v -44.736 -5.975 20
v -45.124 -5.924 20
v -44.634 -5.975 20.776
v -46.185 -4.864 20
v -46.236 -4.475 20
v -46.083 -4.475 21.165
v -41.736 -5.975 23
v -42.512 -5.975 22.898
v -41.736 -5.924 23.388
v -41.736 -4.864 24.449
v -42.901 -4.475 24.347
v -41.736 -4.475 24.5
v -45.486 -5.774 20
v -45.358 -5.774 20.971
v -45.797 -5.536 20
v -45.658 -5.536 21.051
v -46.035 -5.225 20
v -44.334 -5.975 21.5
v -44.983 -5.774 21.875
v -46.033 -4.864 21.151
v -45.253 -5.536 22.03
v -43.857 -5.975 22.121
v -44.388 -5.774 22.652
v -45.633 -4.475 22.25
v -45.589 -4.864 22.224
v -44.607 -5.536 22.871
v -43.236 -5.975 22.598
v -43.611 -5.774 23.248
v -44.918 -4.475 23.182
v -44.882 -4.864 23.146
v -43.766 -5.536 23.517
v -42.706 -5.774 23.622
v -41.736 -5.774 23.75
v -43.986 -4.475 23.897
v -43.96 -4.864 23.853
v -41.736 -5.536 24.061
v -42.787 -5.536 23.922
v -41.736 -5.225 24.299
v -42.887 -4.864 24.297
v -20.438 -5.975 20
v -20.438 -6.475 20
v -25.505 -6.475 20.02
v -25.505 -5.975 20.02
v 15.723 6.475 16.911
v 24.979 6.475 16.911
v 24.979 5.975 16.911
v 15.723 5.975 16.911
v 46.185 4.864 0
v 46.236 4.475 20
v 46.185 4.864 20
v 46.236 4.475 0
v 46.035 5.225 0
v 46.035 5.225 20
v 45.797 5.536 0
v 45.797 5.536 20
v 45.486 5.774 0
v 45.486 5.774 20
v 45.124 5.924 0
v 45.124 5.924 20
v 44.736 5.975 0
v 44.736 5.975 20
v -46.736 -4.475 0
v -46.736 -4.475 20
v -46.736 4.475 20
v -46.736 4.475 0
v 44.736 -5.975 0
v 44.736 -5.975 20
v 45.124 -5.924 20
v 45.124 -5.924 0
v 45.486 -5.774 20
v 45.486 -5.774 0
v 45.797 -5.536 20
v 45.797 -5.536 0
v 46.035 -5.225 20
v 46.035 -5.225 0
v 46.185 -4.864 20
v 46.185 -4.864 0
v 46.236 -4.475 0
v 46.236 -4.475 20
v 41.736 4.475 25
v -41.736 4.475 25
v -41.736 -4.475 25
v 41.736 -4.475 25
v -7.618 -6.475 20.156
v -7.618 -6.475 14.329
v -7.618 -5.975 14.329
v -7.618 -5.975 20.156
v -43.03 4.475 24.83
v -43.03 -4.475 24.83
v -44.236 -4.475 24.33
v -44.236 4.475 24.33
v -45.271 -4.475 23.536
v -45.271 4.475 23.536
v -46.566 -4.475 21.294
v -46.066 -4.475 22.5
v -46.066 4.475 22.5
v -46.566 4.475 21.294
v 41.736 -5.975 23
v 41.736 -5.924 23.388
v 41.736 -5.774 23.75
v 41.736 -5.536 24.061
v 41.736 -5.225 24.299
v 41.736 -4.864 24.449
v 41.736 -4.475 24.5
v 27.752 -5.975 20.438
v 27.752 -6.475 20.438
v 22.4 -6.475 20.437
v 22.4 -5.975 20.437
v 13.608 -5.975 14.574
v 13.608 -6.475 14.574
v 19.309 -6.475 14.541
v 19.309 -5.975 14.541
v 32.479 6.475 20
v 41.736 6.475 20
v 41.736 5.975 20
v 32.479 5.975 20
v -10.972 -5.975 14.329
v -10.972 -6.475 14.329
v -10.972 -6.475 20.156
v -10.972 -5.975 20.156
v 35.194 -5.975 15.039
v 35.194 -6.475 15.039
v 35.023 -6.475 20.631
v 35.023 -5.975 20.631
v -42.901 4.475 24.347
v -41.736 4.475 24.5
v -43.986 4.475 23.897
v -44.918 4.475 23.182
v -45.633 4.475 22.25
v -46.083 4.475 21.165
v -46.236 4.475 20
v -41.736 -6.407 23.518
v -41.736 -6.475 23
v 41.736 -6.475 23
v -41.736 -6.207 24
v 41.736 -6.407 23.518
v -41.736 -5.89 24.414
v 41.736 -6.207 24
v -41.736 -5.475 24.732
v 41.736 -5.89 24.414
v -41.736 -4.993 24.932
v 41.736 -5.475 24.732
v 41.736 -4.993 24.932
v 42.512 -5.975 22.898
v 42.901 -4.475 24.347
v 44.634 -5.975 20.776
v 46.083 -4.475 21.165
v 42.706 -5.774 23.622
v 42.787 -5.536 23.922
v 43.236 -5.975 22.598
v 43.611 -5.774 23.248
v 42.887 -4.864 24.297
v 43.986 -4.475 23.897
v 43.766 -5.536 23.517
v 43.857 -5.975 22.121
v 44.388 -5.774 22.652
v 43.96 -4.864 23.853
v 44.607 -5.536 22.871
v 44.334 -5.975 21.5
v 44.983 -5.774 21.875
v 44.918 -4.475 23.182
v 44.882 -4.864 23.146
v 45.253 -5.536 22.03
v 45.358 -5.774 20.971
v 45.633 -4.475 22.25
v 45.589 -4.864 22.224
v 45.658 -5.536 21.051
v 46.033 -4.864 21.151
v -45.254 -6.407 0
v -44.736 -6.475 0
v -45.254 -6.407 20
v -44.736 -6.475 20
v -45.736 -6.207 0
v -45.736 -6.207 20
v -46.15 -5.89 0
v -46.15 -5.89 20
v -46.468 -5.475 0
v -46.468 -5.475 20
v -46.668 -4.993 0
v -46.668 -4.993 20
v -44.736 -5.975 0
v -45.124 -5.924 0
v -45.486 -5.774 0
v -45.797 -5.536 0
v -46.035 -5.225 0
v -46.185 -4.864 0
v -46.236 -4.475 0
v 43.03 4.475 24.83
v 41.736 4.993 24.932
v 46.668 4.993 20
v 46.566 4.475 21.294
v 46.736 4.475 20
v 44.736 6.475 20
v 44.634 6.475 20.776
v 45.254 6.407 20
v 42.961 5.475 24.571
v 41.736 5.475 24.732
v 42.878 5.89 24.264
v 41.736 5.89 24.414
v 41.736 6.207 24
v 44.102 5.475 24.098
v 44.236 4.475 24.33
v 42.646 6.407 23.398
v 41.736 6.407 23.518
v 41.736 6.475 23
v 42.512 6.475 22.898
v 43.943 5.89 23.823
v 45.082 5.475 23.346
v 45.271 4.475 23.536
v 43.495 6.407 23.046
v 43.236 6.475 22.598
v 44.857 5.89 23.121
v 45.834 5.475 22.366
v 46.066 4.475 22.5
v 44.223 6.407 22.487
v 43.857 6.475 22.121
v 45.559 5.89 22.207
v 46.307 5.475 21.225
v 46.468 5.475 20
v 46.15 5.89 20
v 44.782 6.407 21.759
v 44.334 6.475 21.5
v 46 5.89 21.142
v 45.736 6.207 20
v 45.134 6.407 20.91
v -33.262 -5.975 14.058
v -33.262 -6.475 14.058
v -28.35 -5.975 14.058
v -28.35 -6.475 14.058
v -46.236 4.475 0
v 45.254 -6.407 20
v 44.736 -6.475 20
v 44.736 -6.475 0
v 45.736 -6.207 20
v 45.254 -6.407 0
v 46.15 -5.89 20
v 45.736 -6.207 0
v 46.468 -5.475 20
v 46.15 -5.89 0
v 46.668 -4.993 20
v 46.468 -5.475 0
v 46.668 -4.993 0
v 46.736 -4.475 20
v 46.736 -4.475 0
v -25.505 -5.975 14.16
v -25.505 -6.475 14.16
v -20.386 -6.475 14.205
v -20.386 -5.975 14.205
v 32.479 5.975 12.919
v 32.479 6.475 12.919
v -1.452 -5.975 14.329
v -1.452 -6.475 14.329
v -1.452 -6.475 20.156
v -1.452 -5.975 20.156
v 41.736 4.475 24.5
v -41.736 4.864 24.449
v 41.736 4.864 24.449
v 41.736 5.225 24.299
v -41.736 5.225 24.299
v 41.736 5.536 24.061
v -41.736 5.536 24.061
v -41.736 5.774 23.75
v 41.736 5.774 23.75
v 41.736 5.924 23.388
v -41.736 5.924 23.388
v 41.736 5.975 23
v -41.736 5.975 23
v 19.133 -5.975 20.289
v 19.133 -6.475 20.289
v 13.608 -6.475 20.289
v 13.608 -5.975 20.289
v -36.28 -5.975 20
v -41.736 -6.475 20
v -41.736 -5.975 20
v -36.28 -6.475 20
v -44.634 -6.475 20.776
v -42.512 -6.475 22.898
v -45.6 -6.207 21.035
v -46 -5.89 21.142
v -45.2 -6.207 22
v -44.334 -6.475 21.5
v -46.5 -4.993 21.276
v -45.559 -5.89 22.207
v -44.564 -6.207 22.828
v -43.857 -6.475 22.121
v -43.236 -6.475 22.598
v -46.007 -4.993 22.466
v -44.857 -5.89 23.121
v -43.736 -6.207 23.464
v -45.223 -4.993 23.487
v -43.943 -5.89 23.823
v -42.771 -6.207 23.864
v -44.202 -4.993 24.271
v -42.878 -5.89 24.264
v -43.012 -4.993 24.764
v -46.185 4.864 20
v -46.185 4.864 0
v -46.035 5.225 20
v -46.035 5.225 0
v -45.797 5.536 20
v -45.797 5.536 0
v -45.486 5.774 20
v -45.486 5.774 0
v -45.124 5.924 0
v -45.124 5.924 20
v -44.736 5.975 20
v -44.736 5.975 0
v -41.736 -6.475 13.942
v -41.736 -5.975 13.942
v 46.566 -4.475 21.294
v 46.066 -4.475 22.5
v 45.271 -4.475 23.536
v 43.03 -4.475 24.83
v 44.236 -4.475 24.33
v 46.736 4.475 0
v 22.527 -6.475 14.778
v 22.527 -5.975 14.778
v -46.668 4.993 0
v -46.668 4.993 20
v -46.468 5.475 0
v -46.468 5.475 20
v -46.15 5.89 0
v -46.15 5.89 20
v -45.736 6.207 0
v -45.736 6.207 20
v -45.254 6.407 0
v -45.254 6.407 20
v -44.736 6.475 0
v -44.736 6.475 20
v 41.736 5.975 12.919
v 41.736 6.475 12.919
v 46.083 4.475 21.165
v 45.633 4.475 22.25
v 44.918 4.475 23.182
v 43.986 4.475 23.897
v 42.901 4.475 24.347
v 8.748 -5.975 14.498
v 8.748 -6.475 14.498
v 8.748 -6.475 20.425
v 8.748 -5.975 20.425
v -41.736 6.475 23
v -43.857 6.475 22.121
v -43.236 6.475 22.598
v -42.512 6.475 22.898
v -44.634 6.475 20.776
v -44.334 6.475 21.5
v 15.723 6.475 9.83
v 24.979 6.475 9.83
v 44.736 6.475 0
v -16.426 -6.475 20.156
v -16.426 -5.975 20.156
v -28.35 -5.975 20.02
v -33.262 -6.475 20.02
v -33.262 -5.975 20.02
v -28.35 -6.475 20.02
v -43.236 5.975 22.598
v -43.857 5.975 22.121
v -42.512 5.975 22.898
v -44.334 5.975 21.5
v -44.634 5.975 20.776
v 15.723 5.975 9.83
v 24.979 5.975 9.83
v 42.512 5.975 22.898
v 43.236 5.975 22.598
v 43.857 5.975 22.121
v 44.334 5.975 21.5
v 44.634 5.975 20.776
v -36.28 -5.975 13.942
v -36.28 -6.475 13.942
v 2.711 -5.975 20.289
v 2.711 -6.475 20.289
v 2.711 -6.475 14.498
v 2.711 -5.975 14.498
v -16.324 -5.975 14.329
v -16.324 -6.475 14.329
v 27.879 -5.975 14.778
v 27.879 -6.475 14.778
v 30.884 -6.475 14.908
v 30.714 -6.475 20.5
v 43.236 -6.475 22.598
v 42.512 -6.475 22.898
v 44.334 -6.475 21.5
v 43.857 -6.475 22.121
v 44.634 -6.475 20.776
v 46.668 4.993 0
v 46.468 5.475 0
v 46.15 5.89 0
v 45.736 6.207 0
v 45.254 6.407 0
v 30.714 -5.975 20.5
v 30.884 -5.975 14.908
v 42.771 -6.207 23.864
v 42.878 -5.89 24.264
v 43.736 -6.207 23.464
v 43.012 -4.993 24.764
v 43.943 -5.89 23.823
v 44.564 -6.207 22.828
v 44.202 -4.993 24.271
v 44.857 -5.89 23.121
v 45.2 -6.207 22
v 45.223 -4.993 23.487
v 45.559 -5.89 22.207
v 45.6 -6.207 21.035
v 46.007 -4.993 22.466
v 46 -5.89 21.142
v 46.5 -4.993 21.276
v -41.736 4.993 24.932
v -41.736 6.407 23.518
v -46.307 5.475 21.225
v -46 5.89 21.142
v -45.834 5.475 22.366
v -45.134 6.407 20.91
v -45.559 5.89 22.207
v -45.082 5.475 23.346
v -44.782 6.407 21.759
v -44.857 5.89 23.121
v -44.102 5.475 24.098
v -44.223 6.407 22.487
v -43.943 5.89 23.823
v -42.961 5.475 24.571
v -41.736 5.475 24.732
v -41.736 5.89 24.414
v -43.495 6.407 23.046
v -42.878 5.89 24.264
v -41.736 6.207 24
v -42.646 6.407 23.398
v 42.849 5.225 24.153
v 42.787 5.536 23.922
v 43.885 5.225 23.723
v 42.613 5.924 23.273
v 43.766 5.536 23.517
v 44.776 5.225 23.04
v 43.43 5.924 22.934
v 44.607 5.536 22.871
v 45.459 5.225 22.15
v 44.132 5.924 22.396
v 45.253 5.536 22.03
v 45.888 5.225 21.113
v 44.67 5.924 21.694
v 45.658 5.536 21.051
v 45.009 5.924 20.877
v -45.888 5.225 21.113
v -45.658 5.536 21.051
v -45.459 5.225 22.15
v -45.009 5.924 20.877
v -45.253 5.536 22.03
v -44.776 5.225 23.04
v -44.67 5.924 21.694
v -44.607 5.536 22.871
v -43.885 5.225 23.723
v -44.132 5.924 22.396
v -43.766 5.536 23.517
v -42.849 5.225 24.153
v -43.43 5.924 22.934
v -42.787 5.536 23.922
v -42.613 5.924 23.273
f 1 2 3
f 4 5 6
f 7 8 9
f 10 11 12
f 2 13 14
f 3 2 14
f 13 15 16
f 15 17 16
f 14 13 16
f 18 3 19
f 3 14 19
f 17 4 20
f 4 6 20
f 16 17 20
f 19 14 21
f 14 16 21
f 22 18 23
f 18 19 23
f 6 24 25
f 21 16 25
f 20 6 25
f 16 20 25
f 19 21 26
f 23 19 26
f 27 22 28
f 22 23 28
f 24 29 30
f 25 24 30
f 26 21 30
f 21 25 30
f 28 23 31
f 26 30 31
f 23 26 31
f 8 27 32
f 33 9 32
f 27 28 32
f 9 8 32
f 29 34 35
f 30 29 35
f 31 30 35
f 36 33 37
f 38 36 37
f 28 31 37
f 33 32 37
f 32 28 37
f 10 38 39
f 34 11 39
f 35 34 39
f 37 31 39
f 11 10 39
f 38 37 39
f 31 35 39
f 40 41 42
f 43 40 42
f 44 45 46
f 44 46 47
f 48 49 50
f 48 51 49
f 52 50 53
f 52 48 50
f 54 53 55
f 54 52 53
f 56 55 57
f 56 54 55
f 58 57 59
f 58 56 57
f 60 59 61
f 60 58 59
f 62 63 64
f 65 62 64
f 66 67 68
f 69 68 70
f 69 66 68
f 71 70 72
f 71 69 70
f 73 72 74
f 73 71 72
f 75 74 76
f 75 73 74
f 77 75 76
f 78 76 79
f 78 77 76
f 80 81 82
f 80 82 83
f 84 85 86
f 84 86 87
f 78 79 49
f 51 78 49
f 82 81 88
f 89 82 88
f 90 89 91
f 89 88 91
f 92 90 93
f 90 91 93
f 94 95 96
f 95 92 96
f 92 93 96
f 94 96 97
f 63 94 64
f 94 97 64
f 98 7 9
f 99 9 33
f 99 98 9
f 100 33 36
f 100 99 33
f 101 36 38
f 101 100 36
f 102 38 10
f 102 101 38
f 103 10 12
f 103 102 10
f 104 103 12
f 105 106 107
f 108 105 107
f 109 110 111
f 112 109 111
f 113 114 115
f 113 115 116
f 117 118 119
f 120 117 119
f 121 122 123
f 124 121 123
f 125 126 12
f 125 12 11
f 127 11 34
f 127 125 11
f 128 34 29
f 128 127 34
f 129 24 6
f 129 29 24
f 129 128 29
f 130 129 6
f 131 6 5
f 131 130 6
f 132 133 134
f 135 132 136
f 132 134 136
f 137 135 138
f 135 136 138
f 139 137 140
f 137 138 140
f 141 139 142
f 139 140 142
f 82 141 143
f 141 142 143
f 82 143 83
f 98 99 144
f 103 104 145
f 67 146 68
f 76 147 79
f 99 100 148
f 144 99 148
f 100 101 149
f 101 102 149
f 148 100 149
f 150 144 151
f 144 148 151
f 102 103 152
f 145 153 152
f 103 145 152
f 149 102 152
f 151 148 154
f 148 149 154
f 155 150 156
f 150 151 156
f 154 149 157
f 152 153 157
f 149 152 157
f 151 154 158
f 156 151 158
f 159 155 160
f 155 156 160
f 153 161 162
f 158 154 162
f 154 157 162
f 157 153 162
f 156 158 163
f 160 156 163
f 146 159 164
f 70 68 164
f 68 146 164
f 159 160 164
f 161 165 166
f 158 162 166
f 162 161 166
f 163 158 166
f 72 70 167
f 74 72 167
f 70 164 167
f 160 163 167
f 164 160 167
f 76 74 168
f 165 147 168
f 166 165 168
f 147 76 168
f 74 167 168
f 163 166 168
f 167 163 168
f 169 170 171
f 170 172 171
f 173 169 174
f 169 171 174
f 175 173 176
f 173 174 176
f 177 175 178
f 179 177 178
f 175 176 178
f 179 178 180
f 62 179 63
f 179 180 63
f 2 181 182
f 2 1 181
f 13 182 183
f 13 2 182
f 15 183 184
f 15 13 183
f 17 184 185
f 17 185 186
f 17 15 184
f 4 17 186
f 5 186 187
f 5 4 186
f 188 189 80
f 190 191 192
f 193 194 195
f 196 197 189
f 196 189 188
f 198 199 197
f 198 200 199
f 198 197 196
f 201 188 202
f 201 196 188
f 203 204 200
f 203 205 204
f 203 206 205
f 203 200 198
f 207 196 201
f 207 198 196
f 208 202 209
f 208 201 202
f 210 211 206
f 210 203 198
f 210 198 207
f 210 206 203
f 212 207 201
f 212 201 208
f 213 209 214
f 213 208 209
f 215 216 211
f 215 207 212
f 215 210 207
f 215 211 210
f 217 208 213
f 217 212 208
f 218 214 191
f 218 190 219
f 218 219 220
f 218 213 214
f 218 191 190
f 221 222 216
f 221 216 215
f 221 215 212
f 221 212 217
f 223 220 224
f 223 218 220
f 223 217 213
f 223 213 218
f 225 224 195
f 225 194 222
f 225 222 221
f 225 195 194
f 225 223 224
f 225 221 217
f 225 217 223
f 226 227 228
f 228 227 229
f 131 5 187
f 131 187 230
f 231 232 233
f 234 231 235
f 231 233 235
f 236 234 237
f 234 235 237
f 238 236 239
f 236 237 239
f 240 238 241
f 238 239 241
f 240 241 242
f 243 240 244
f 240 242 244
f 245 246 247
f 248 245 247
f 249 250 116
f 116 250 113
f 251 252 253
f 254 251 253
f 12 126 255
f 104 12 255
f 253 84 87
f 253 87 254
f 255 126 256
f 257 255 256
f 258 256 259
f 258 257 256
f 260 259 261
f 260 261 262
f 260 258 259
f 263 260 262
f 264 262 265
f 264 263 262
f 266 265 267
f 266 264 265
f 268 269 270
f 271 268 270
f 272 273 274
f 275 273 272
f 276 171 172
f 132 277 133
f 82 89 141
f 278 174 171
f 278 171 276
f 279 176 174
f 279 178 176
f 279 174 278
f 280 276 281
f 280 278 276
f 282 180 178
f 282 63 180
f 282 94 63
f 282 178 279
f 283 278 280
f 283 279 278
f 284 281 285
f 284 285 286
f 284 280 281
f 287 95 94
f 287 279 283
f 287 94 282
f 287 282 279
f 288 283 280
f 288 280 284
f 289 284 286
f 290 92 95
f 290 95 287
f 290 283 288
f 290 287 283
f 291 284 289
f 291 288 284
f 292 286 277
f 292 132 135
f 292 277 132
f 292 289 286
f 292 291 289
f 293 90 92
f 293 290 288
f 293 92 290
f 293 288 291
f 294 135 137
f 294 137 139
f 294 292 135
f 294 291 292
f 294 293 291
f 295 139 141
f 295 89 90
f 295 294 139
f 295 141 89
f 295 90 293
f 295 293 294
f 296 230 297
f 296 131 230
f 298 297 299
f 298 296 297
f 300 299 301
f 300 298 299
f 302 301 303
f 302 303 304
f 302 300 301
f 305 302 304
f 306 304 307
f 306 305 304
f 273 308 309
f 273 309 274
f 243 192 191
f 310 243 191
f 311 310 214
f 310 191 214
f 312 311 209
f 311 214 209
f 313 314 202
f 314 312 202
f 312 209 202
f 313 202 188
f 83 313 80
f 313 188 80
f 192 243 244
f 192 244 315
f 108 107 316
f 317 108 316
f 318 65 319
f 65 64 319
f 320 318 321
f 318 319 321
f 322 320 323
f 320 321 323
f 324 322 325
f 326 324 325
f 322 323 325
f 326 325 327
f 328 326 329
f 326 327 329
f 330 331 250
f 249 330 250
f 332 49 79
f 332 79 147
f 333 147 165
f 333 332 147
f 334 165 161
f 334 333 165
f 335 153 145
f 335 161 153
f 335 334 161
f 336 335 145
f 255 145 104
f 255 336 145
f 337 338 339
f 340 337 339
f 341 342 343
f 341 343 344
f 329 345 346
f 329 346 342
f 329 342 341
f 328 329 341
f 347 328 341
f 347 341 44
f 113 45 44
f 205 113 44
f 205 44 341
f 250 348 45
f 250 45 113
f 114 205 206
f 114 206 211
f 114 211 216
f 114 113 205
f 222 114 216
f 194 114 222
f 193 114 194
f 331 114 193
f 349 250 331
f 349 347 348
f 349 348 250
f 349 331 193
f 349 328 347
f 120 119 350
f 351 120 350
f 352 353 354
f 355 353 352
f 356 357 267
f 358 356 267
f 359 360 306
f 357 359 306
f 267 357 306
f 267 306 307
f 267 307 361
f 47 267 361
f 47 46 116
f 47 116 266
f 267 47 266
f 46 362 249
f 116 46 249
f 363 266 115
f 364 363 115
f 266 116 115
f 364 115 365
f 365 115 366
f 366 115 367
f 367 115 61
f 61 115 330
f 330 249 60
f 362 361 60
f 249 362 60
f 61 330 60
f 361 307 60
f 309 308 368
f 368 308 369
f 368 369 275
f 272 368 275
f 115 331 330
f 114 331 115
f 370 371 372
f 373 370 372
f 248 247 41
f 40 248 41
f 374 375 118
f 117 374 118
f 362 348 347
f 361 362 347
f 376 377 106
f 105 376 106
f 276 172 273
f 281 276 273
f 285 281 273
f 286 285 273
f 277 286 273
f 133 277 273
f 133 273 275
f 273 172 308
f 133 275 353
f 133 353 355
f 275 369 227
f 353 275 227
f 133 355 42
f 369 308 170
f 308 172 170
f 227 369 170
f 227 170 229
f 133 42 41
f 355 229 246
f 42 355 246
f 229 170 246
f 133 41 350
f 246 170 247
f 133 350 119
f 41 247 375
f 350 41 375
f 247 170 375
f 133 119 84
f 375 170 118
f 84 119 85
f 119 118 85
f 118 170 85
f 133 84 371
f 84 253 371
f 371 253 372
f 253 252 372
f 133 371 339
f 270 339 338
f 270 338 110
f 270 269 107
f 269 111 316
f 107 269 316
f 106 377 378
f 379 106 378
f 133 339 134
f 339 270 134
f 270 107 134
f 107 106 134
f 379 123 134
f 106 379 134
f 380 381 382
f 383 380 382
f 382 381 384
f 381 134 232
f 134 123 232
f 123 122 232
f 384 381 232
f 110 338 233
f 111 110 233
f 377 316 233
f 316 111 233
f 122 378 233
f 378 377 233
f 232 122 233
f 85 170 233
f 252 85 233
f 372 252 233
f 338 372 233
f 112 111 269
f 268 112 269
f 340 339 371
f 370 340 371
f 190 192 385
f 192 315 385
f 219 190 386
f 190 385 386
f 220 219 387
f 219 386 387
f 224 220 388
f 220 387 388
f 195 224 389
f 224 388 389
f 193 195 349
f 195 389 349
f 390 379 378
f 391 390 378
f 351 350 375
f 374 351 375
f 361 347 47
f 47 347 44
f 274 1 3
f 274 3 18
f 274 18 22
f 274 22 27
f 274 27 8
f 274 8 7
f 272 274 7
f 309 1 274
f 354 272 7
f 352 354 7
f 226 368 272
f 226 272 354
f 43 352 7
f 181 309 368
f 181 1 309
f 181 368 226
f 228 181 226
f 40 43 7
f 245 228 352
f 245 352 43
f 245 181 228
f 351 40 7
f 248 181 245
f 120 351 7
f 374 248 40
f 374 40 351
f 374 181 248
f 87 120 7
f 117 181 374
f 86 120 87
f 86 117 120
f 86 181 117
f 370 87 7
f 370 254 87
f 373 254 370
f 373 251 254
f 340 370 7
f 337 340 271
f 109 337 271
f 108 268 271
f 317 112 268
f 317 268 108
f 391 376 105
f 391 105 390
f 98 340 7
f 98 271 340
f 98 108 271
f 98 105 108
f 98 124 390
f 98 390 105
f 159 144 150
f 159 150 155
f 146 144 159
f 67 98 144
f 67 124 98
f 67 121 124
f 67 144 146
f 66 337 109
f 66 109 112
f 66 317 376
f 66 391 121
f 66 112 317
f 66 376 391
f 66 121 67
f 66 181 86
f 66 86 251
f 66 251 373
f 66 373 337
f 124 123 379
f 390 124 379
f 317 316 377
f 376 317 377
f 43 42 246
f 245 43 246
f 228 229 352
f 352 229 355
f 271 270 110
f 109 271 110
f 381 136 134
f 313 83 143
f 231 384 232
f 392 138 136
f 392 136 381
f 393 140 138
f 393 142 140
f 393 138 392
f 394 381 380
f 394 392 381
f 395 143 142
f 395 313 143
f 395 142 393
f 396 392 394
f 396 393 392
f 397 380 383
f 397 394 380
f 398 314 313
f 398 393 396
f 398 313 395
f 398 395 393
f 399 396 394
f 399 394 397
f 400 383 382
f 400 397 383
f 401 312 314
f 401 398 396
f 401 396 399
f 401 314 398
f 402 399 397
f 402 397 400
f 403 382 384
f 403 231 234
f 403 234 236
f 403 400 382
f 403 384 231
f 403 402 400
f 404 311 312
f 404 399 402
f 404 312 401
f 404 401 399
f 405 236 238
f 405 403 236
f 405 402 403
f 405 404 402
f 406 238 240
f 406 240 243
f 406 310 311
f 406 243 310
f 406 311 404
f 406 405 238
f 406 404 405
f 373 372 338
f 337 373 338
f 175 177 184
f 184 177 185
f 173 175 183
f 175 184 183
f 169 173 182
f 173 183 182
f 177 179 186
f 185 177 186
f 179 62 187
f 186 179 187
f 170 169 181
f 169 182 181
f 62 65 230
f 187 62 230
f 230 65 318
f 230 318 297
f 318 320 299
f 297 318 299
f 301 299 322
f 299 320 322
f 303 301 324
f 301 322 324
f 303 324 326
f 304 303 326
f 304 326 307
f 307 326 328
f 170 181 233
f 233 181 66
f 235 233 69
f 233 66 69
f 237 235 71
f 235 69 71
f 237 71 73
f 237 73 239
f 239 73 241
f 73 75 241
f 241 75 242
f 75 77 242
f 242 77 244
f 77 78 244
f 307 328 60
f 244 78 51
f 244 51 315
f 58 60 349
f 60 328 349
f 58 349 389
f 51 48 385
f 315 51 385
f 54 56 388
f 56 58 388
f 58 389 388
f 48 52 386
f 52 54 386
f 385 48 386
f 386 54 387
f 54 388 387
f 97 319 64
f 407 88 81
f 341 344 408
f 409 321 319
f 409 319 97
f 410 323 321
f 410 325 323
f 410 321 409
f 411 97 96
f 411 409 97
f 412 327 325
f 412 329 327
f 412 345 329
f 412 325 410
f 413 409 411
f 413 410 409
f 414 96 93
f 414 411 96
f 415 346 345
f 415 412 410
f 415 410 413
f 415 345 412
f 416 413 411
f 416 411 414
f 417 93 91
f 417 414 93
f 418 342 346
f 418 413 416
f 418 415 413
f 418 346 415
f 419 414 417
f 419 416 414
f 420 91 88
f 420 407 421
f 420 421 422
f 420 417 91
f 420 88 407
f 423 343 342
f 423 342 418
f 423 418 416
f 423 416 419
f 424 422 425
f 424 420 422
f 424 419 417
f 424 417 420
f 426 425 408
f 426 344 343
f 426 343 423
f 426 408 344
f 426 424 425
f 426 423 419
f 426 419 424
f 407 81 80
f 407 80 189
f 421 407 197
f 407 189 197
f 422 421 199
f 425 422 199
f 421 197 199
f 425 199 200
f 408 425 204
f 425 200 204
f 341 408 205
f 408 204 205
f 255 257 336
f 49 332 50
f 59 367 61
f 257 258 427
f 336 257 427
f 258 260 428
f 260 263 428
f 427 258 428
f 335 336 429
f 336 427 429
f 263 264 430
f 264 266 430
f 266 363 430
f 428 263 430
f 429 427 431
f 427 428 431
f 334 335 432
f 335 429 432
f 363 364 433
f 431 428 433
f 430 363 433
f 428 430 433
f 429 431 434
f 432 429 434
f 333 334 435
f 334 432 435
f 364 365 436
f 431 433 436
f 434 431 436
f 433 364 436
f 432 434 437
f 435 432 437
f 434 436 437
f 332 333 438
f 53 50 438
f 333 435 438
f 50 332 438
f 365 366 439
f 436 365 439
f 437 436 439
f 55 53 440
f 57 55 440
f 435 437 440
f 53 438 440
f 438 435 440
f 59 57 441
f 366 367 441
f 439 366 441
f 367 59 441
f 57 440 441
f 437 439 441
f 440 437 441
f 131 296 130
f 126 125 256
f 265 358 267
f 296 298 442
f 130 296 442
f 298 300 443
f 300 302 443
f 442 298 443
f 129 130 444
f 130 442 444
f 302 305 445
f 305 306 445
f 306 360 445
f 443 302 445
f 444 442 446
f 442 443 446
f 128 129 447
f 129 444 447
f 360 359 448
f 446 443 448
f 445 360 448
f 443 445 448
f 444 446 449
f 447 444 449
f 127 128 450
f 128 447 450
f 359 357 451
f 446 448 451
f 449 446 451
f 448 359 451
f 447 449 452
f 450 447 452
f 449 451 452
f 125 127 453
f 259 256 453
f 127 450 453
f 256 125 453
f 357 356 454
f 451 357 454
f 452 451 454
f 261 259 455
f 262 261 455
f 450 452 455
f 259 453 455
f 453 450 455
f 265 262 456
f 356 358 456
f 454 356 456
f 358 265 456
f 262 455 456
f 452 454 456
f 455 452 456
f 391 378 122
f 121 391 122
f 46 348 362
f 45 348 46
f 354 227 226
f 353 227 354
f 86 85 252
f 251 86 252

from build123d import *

# Parameters (mm, degrees)
F0_W     = 93.4718027711
F0_H     = 12.9508469254
F1_DEPTH = 25
F2_R     = 5
F3_R     = 5
F4_R     = 2
F5_T     = -0.5
F6_W     = 5.4559892522
F6_H     = 6.0577589622
F6_W_2   = 4.9121007323
F6_H_2   = 5.9622740373
F6_W_3   = 6.1655344907
F6_H_3   = 5.8267693967
F7_DEPTH = 10
F8_W     = 9.2564252019
F8_H     = 7.081441097
F9_DEPTH = 5


with BuildPart() as f1:
    # F0 (on Top) → F1 (new body)
    with BuildSketch(Plane.XY):
        Rectangle(F0_W, F0_H)
    extrude(amount=F1_DEPTH)

    # F2
    f2_edges = [f1.edges().sort_by_distance(p)[0] for p in [
        (46.735901, 0, 25),
    ]]
    fillet(f2_edges, radius=F2_R)

    # F3
    f3_edges = [f1.edges().sort_by_distance(p)[0] for p in [
        (-46.735901, 0, 25),
    ]]
    fillet(f3_edges, radius=F3_R)

    # F4
    f4_edges = [f1.edges().sort_by_distance(p)[0] for p in [
        (0, -6.475423, 25),
        (0, 6.475423, 25),
        (46.735901, 6.475423, 10),
        (46.735901, -6.475423, 10),
        (-46.735901, -6.475423, 10),
        (-45.271435, -6.475423, 23.535534),
        (45.271435, -6.475423, 23.535534),
        (-45.271435, 6.475423, 23.535534),
        (45.271435, 6.475423, 23.535534),
        (-46.735901, 6.475423, 10),
    ]]
    fillet(f4_edges, radius=F4_R)

    # F5
    f5_openings = [f1.faces().sort_by_distance(p)[0] for p in [
        (0, 0, 0),
    ]]
    offset(amount=F5_T, openings=f5_openings)

    # F6 (on face) → F7 (cut)
    with BuildSketch(Plane.XZ.offset(6.4754234627)):
        with Locations((-39.0079067595, 16.9711205189)):
            Rectangle(F6_W, F6_H)
        with Locations((-30.8063998818, 17.0389381237)):
            Rectangle(F6_W_2, F6_H_2)
        Polygon((-25.5047174612, 20.0200751424), (-25.5047174612, 14.1596693691), (-20.3863596622, 14.2051883272), (-20.43789451, 20), align=None)
        Polygon((-16.4258014411, 20.155582577), (-16.3241717964, 14.3288131803), (-10.9716746956, 14.3288131803), (-10.9716746956, 20.155582577), align=None)
        with Locations((-4.5351273147, 17.2421978787)):
            Rectangle(F6_W_3, F6_H_3)
        Polygon((2.711430509, 20.2894311491), (2.711430509, 14.4981949606), (8.747510295, 14.4981949606), (8.747510295, 20.4250746066), align=None)
        Polygon((19.1331994785, 20.2894311491), (13.6082590709, 20.2894311491), (13.6082590709, 14.5744122565), (19.308578223, 14.5405353978), align=None)
        Polygon((22.3996791117, 20.4367674267), (22.5268509239, 14.7776724771), (27.8793480247, 14.7776724771), (27.7521591139, 20.4375283061), align=None)
        Polygon((30.7136761403, 20.5000031751), (30.8842776962, 14.9077031341), (35.1938740726, 15.0391738782), (35.0232725167, 20.6314739191), align=None)
    extrude(amount=-F7_DEPTH, mode=Mode.SUBTRACT)

    # F8 (on face) → F9 (cut)
    with BuildSketch(Plane(origin=(0, 6.4754234627, 0), x_dir=(-1, 0, 0), z_dir=(0, 1, 0))):
        with Locations((-37.1076887846, 16.4592794515)):
            Rectangle(F8_W, F8_H)
        with Locations((-20.3512632847, 13.3706254326)):
            Rectangle(F8_W, F8_H)
    extrude(amount=-F9_DEPTH, mode=Mode.SUBTRACT)


solid = f1.part
